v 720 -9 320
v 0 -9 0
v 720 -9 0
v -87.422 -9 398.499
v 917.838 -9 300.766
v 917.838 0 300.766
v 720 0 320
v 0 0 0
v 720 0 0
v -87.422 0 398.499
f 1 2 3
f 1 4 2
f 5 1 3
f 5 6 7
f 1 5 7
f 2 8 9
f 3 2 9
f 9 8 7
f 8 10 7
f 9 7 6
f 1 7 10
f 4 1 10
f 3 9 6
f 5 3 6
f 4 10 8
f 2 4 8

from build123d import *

# Parameters (mm, degrees)
F1_DEPTH = 9


with BuildPart() as f1:
    # F0 (on Front) → F1 (new body)
    with BuildSketch(Plane.XZ):
        Polygon((0, 390), (0, 0), (720, 0), (720, 320), align=None)
        Polygon((-87.421968, 398.499358), (0, 0), (0, 390), align=None)
        Polygon((720, 320), (720, 0), (917.838265, 300.765724), align=None)
    extrude(amount=F1_DEPTH)


solid = f1.part
